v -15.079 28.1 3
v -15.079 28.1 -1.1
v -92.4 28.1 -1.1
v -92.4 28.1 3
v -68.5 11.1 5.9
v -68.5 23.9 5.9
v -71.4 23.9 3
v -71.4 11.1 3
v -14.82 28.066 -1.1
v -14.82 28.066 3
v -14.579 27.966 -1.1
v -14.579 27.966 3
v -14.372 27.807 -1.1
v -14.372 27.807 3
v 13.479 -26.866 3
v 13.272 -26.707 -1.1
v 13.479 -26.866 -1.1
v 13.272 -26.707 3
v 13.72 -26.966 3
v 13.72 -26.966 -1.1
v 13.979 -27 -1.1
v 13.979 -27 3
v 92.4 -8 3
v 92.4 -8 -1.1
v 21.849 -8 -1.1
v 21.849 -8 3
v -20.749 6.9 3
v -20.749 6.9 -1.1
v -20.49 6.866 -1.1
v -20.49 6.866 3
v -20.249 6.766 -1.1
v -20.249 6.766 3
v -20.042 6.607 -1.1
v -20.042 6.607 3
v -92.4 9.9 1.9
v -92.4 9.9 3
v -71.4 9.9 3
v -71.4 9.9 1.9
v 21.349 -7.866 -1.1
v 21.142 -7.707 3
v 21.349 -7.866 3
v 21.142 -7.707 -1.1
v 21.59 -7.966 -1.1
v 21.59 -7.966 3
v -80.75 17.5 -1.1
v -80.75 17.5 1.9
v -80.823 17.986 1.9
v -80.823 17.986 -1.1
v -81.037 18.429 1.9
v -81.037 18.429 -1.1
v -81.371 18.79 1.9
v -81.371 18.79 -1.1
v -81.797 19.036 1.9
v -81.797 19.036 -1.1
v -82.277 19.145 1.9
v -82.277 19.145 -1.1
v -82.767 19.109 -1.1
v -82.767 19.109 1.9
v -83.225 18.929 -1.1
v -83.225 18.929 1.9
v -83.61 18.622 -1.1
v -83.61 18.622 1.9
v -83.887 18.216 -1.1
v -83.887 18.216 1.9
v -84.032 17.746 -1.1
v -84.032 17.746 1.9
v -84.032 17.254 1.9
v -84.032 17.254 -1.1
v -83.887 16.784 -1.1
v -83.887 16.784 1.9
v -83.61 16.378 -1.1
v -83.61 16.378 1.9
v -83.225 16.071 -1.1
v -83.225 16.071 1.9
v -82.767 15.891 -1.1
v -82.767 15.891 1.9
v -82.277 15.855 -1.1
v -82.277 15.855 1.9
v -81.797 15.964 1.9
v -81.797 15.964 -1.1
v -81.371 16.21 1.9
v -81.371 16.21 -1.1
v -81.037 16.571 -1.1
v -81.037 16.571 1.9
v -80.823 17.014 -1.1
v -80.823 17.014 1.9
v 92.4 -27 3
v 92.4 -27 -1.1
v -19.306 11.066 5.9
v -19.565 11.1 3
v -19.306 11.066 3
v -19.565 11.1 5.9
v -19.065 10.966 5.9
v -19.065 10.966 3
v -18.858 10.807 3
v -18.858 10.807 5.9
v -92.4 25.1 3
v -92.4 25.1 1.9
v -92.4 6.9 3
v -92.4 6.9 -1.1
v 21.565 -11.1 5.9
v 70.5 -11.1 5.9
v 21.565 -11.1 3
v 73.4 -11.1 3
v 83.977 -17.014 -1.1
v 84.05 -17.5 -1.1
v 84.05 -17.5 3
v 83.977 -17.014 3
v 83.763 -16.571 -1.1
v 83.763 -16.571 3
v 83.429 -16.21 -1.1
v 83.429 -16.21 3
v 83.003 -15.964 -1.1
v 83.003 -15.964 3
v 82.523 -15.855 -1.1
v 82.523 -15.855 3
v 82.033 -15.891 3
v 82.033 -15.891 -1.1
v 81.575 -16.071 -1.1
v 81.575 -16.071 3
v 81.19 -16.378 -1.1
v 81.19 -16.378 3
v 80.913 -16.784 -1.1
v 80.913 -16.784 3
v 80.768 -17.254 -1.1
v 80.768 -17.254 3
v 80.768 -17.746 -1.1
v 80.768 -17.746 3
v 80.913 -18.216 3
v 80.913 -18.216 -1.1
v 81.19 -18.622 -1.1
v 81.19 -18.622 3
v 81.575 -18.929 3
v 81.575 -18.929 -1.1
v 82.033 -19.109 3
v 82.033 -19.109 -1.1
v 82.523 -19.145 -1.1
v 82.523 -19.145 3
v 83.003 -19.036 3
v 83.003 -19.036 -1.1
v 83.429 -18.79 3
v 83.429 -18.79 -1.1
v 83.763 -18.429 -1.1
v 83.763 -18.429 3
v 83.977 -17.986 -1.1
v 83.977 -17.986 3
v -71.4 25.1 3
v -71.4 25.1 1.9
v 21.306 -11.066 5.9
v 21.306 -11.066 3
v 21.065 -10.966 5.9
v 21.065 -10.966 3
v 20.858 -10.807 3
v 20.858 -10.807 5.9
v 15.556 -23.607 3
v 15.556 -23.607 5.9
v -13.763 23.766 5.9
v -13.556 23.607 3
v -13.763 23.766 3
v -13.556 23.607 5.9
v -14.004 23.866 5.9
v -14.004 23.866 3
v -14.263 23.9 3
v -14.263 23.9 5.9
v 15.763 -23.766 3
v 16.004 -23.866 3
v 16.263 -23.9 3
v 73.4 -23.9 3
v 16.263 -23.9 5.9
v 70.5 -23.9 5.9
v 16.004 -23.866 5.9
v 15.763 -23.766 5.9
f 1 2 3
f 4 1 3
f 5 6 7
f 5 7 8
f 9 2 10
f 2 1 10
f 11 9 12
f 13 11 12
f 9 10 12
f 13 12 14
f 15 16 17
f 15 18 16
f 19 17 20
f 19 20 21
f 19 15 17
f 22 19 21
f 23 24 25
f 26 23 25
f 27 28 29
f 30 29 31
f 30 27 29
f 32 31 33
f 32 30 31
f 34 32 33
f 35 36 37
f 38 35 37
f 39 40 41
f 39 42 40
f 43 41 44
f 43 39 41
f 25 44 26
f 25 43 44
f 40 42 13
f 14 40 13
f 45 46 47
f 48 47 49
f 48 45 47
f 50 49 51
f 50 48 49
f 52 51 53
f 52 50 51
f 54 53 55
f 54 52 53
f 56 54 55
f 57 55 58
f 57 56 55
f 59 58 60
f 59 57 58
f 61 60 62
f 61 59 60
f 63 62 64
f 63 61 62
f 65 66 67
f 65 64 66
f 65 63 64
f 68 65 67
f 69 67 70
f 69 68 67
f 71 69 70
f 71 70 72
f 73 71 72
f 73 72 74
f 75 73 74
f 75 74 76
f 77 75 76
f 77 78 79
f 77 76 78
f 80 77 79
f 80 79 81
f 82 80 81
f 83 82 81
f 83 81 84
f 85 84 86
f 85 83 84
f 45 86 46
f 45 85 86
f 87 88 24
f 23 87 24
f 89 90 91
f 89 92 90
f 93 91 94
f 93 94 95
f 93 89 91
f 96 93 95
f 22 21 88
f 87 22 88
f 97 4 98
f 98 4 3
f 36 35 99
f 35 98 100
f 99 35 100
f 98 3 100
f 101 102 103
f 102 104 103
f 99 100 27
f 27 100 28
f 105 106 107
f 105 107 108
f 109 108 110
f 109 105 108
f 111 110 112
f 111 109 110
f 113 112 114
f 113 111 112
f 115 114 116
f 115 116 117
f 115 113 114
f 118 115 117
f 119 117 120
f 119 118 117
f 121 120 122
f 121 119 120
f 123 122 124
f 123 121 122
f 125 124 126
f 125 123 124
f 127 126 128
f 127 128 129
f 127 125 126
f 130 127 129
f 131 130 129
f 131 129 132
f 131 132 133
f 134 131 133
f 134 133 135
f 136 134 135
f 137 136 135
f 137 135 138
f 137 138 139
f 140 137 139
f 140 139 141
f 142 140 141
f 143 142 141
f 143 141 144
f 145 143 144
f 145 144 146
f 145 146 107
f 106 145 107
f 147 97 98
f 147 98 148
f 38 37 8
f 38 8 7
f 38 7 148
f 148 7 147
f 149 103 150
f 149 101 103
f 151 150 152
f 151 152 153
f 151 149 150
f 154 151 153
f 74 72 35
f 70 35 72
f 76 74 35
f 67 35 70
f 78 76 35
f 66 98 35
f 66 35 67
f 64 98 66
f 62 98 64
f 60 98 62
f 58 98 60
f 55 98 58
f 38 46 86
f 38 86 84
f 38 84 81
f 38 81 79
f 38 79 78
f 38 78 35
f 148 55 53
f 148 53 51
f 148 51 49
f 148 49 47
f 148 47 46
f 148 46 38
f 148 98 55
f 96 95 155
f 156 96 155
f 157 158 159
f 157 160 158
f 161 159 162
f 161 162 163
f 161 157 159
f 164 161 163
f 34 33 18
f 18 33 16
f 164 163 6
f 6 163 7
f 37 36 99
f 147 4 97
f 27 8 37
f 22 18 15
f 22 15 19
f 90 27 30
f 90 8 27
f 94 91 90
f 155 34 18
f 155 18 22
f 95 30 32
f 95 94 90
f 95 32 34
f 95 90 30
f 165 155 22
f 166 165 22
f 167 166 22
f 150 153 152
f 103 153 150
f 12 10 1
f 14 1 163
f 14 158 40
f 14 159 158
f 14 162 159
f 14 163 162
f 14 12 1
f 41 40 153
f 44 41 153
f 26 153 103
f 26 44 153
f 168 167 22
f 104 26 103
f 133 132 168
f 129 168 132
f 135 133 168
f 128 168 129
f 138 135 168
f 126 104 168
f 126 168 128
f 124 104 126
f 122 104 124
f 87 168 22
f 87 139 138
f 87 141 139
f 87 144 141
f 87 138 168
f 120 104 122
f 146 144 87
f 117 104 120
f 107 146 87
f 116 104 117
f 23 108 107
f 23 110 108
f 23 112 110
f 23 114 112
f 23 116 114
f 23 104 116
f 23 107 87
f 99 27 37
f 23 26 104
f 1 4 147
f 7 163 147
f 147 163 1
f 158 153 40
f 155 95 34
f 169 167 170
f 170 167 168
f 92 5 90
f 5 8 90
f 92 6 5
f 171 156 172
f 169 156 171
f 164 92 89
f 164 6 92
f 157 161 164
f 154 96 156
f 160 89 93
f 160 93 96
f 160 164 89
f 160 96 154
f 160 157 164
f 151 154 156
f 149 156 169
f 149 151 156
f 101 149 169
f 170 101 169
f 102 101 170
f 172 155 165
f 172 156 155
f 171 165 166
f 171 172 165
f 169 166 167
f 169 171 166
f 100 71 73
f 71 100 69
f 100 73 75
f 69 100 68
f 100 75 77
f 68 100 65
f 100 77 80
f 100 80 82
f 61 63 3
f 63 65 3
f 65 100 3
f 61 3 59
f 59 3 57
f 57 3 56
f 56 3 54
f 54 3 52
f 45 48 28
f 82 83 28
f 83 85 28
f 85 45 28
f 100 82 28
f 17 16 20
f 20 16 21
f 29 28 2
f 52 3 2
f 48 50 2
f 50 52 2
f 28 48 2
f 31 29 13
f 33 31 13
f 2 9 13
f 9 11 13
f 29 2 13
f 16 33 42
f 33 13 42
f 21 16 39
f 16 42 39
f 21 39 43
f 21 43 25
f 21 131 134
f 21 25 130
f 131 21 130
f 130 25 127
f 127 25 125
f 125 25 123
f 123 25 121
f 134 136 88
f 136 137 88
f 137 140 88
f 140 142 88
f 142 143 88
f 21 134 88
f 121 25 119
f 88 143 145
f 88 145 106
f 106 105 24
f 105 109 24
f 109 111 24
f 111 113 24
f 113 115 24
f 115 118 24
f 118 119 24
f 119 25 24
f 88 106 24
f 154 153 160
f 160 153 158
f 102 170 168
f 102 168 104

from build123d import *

# Parameters (mm, degrees)
SKETCH_1_R          = 1.65
EXTRUDE_1_DEPTH     = 3
EXTRUDE_2_DEPTH     = 2.9
CHAMFER_1_SIZE      = 2.9
EXTRUDE_START       = -1.1
SKETCH_6_R          = 1.65
EXTRUDE_3_DEPTH     = 4.1
CUT_EXTRUDE_START   = 3
SKETCH_7_W          = 21
SKETCH_7_H          = 15.2
CUT_EXTRUDE_1_DEPTH = 1.1
FILLET_1_R          = 1


with BuildPart() as part:
    # 草图1 → 凸台-拉伸1 (new body)
    with BuildSketch(Plane.XY):
        Polygon((-92.4, 27), (-13.564971157, 27), (21.435028843, -8), (92.4, -8), (92.4, -27), (13.564971157, -27), (-21.435028843, 8), (-92.4, 8), align=None)
        with Locations((-82.4, 17.5)):
            Circle(SKETCH_1_R, mode=Mode.SUBTRACT)
        with Locations((82.4, -17.5)):
            Circle(SKETCH_1_R, mode=Mode.SUBTRACT)
    extrude(amount=EXTRUDE_1_DEPTH)

    # 草图2 → 凸台-拉伸2 (add)
    with BuildSketch(Plane.XY.offset(3)):
        Polygon((-71.4, 23.9), (-71.4, 11.1), (-19.150966799, 11.1), (15.849033201, -23.9), (73.4, -23.9), (73.4, -11.1), (21.150966799, -11.1), (-13.849033201, 23.9), align=None)
    extrude(amount=EXTRUDE_2_DEPTH)

    # 倒角1
    chamfer_1_edges = [part.edges().sort_by_distance(p)[0] for p in [
        (73.4, -17.5, 5.9),
        (-71.4, 17.5, 5.9),
    ]]
    chamfer(chamfer_1_edges, length=CHAMFER_1_SIZE - 0.0001)  # a hair under: the kernel refuses the full size

    # 草图6 → 凸台-拉伸3 (add)
    with BuildSketch(Plane.XY.offset(EXTRUDE_START)):
        Polygon((-92.4, 28.1), (-92.4, 6.9), (-20.335028843, 6.9), (13.564971157, -27), (92.4, -27), (92.4, -8), (21.435028843, -8), (-14.664971157, 28.1), align=None)
        with Locations((-82.4, 17.5)):
            Circle(SKETCH_6_R, mode=Mode.SUBTRACT)
        with Locations((82.4, -17.5)):
            Circle(SKETCH_6_R, mode=Mode.SUBTRACT)
    extrude(amount=EXTRUDE_3_DEPTH)

    # 草图7 → 切除-拉伸1 (cut)
    with BuildSketch(Plane.XY.offset(CUT_EXTRUDE_START)):
        with Locations((-81.9, 17.5)):
            Rectangle(SKETCH_7_W, SKETCH_7_H)
    extrude(amount=-CUT_EXTRUDE_1_DEPTH, mode=Mode.SUBTRACT)

    # 圆角1
    fillet_1_edges = [part.edges().sort_by_distance(p)[0] for p in [
        (21.435028843, -8, 0.95),
        (13.564971157, -27, 0.95),
        (-13.849033201, 23.9, 4.45),
        (-19.150966799, 11.1, 4.45),
        (15.849033201, -23.9, 4.45),
        (21.150966799, -11.1, 4.45),
        (-14.664971157, 28.1, 0.95),
        (-20.335028843, 6.9, 0.95),
    ]]
    fillet(fillet_1_edges, radius=FILLET_1_R)


solid = part.part
